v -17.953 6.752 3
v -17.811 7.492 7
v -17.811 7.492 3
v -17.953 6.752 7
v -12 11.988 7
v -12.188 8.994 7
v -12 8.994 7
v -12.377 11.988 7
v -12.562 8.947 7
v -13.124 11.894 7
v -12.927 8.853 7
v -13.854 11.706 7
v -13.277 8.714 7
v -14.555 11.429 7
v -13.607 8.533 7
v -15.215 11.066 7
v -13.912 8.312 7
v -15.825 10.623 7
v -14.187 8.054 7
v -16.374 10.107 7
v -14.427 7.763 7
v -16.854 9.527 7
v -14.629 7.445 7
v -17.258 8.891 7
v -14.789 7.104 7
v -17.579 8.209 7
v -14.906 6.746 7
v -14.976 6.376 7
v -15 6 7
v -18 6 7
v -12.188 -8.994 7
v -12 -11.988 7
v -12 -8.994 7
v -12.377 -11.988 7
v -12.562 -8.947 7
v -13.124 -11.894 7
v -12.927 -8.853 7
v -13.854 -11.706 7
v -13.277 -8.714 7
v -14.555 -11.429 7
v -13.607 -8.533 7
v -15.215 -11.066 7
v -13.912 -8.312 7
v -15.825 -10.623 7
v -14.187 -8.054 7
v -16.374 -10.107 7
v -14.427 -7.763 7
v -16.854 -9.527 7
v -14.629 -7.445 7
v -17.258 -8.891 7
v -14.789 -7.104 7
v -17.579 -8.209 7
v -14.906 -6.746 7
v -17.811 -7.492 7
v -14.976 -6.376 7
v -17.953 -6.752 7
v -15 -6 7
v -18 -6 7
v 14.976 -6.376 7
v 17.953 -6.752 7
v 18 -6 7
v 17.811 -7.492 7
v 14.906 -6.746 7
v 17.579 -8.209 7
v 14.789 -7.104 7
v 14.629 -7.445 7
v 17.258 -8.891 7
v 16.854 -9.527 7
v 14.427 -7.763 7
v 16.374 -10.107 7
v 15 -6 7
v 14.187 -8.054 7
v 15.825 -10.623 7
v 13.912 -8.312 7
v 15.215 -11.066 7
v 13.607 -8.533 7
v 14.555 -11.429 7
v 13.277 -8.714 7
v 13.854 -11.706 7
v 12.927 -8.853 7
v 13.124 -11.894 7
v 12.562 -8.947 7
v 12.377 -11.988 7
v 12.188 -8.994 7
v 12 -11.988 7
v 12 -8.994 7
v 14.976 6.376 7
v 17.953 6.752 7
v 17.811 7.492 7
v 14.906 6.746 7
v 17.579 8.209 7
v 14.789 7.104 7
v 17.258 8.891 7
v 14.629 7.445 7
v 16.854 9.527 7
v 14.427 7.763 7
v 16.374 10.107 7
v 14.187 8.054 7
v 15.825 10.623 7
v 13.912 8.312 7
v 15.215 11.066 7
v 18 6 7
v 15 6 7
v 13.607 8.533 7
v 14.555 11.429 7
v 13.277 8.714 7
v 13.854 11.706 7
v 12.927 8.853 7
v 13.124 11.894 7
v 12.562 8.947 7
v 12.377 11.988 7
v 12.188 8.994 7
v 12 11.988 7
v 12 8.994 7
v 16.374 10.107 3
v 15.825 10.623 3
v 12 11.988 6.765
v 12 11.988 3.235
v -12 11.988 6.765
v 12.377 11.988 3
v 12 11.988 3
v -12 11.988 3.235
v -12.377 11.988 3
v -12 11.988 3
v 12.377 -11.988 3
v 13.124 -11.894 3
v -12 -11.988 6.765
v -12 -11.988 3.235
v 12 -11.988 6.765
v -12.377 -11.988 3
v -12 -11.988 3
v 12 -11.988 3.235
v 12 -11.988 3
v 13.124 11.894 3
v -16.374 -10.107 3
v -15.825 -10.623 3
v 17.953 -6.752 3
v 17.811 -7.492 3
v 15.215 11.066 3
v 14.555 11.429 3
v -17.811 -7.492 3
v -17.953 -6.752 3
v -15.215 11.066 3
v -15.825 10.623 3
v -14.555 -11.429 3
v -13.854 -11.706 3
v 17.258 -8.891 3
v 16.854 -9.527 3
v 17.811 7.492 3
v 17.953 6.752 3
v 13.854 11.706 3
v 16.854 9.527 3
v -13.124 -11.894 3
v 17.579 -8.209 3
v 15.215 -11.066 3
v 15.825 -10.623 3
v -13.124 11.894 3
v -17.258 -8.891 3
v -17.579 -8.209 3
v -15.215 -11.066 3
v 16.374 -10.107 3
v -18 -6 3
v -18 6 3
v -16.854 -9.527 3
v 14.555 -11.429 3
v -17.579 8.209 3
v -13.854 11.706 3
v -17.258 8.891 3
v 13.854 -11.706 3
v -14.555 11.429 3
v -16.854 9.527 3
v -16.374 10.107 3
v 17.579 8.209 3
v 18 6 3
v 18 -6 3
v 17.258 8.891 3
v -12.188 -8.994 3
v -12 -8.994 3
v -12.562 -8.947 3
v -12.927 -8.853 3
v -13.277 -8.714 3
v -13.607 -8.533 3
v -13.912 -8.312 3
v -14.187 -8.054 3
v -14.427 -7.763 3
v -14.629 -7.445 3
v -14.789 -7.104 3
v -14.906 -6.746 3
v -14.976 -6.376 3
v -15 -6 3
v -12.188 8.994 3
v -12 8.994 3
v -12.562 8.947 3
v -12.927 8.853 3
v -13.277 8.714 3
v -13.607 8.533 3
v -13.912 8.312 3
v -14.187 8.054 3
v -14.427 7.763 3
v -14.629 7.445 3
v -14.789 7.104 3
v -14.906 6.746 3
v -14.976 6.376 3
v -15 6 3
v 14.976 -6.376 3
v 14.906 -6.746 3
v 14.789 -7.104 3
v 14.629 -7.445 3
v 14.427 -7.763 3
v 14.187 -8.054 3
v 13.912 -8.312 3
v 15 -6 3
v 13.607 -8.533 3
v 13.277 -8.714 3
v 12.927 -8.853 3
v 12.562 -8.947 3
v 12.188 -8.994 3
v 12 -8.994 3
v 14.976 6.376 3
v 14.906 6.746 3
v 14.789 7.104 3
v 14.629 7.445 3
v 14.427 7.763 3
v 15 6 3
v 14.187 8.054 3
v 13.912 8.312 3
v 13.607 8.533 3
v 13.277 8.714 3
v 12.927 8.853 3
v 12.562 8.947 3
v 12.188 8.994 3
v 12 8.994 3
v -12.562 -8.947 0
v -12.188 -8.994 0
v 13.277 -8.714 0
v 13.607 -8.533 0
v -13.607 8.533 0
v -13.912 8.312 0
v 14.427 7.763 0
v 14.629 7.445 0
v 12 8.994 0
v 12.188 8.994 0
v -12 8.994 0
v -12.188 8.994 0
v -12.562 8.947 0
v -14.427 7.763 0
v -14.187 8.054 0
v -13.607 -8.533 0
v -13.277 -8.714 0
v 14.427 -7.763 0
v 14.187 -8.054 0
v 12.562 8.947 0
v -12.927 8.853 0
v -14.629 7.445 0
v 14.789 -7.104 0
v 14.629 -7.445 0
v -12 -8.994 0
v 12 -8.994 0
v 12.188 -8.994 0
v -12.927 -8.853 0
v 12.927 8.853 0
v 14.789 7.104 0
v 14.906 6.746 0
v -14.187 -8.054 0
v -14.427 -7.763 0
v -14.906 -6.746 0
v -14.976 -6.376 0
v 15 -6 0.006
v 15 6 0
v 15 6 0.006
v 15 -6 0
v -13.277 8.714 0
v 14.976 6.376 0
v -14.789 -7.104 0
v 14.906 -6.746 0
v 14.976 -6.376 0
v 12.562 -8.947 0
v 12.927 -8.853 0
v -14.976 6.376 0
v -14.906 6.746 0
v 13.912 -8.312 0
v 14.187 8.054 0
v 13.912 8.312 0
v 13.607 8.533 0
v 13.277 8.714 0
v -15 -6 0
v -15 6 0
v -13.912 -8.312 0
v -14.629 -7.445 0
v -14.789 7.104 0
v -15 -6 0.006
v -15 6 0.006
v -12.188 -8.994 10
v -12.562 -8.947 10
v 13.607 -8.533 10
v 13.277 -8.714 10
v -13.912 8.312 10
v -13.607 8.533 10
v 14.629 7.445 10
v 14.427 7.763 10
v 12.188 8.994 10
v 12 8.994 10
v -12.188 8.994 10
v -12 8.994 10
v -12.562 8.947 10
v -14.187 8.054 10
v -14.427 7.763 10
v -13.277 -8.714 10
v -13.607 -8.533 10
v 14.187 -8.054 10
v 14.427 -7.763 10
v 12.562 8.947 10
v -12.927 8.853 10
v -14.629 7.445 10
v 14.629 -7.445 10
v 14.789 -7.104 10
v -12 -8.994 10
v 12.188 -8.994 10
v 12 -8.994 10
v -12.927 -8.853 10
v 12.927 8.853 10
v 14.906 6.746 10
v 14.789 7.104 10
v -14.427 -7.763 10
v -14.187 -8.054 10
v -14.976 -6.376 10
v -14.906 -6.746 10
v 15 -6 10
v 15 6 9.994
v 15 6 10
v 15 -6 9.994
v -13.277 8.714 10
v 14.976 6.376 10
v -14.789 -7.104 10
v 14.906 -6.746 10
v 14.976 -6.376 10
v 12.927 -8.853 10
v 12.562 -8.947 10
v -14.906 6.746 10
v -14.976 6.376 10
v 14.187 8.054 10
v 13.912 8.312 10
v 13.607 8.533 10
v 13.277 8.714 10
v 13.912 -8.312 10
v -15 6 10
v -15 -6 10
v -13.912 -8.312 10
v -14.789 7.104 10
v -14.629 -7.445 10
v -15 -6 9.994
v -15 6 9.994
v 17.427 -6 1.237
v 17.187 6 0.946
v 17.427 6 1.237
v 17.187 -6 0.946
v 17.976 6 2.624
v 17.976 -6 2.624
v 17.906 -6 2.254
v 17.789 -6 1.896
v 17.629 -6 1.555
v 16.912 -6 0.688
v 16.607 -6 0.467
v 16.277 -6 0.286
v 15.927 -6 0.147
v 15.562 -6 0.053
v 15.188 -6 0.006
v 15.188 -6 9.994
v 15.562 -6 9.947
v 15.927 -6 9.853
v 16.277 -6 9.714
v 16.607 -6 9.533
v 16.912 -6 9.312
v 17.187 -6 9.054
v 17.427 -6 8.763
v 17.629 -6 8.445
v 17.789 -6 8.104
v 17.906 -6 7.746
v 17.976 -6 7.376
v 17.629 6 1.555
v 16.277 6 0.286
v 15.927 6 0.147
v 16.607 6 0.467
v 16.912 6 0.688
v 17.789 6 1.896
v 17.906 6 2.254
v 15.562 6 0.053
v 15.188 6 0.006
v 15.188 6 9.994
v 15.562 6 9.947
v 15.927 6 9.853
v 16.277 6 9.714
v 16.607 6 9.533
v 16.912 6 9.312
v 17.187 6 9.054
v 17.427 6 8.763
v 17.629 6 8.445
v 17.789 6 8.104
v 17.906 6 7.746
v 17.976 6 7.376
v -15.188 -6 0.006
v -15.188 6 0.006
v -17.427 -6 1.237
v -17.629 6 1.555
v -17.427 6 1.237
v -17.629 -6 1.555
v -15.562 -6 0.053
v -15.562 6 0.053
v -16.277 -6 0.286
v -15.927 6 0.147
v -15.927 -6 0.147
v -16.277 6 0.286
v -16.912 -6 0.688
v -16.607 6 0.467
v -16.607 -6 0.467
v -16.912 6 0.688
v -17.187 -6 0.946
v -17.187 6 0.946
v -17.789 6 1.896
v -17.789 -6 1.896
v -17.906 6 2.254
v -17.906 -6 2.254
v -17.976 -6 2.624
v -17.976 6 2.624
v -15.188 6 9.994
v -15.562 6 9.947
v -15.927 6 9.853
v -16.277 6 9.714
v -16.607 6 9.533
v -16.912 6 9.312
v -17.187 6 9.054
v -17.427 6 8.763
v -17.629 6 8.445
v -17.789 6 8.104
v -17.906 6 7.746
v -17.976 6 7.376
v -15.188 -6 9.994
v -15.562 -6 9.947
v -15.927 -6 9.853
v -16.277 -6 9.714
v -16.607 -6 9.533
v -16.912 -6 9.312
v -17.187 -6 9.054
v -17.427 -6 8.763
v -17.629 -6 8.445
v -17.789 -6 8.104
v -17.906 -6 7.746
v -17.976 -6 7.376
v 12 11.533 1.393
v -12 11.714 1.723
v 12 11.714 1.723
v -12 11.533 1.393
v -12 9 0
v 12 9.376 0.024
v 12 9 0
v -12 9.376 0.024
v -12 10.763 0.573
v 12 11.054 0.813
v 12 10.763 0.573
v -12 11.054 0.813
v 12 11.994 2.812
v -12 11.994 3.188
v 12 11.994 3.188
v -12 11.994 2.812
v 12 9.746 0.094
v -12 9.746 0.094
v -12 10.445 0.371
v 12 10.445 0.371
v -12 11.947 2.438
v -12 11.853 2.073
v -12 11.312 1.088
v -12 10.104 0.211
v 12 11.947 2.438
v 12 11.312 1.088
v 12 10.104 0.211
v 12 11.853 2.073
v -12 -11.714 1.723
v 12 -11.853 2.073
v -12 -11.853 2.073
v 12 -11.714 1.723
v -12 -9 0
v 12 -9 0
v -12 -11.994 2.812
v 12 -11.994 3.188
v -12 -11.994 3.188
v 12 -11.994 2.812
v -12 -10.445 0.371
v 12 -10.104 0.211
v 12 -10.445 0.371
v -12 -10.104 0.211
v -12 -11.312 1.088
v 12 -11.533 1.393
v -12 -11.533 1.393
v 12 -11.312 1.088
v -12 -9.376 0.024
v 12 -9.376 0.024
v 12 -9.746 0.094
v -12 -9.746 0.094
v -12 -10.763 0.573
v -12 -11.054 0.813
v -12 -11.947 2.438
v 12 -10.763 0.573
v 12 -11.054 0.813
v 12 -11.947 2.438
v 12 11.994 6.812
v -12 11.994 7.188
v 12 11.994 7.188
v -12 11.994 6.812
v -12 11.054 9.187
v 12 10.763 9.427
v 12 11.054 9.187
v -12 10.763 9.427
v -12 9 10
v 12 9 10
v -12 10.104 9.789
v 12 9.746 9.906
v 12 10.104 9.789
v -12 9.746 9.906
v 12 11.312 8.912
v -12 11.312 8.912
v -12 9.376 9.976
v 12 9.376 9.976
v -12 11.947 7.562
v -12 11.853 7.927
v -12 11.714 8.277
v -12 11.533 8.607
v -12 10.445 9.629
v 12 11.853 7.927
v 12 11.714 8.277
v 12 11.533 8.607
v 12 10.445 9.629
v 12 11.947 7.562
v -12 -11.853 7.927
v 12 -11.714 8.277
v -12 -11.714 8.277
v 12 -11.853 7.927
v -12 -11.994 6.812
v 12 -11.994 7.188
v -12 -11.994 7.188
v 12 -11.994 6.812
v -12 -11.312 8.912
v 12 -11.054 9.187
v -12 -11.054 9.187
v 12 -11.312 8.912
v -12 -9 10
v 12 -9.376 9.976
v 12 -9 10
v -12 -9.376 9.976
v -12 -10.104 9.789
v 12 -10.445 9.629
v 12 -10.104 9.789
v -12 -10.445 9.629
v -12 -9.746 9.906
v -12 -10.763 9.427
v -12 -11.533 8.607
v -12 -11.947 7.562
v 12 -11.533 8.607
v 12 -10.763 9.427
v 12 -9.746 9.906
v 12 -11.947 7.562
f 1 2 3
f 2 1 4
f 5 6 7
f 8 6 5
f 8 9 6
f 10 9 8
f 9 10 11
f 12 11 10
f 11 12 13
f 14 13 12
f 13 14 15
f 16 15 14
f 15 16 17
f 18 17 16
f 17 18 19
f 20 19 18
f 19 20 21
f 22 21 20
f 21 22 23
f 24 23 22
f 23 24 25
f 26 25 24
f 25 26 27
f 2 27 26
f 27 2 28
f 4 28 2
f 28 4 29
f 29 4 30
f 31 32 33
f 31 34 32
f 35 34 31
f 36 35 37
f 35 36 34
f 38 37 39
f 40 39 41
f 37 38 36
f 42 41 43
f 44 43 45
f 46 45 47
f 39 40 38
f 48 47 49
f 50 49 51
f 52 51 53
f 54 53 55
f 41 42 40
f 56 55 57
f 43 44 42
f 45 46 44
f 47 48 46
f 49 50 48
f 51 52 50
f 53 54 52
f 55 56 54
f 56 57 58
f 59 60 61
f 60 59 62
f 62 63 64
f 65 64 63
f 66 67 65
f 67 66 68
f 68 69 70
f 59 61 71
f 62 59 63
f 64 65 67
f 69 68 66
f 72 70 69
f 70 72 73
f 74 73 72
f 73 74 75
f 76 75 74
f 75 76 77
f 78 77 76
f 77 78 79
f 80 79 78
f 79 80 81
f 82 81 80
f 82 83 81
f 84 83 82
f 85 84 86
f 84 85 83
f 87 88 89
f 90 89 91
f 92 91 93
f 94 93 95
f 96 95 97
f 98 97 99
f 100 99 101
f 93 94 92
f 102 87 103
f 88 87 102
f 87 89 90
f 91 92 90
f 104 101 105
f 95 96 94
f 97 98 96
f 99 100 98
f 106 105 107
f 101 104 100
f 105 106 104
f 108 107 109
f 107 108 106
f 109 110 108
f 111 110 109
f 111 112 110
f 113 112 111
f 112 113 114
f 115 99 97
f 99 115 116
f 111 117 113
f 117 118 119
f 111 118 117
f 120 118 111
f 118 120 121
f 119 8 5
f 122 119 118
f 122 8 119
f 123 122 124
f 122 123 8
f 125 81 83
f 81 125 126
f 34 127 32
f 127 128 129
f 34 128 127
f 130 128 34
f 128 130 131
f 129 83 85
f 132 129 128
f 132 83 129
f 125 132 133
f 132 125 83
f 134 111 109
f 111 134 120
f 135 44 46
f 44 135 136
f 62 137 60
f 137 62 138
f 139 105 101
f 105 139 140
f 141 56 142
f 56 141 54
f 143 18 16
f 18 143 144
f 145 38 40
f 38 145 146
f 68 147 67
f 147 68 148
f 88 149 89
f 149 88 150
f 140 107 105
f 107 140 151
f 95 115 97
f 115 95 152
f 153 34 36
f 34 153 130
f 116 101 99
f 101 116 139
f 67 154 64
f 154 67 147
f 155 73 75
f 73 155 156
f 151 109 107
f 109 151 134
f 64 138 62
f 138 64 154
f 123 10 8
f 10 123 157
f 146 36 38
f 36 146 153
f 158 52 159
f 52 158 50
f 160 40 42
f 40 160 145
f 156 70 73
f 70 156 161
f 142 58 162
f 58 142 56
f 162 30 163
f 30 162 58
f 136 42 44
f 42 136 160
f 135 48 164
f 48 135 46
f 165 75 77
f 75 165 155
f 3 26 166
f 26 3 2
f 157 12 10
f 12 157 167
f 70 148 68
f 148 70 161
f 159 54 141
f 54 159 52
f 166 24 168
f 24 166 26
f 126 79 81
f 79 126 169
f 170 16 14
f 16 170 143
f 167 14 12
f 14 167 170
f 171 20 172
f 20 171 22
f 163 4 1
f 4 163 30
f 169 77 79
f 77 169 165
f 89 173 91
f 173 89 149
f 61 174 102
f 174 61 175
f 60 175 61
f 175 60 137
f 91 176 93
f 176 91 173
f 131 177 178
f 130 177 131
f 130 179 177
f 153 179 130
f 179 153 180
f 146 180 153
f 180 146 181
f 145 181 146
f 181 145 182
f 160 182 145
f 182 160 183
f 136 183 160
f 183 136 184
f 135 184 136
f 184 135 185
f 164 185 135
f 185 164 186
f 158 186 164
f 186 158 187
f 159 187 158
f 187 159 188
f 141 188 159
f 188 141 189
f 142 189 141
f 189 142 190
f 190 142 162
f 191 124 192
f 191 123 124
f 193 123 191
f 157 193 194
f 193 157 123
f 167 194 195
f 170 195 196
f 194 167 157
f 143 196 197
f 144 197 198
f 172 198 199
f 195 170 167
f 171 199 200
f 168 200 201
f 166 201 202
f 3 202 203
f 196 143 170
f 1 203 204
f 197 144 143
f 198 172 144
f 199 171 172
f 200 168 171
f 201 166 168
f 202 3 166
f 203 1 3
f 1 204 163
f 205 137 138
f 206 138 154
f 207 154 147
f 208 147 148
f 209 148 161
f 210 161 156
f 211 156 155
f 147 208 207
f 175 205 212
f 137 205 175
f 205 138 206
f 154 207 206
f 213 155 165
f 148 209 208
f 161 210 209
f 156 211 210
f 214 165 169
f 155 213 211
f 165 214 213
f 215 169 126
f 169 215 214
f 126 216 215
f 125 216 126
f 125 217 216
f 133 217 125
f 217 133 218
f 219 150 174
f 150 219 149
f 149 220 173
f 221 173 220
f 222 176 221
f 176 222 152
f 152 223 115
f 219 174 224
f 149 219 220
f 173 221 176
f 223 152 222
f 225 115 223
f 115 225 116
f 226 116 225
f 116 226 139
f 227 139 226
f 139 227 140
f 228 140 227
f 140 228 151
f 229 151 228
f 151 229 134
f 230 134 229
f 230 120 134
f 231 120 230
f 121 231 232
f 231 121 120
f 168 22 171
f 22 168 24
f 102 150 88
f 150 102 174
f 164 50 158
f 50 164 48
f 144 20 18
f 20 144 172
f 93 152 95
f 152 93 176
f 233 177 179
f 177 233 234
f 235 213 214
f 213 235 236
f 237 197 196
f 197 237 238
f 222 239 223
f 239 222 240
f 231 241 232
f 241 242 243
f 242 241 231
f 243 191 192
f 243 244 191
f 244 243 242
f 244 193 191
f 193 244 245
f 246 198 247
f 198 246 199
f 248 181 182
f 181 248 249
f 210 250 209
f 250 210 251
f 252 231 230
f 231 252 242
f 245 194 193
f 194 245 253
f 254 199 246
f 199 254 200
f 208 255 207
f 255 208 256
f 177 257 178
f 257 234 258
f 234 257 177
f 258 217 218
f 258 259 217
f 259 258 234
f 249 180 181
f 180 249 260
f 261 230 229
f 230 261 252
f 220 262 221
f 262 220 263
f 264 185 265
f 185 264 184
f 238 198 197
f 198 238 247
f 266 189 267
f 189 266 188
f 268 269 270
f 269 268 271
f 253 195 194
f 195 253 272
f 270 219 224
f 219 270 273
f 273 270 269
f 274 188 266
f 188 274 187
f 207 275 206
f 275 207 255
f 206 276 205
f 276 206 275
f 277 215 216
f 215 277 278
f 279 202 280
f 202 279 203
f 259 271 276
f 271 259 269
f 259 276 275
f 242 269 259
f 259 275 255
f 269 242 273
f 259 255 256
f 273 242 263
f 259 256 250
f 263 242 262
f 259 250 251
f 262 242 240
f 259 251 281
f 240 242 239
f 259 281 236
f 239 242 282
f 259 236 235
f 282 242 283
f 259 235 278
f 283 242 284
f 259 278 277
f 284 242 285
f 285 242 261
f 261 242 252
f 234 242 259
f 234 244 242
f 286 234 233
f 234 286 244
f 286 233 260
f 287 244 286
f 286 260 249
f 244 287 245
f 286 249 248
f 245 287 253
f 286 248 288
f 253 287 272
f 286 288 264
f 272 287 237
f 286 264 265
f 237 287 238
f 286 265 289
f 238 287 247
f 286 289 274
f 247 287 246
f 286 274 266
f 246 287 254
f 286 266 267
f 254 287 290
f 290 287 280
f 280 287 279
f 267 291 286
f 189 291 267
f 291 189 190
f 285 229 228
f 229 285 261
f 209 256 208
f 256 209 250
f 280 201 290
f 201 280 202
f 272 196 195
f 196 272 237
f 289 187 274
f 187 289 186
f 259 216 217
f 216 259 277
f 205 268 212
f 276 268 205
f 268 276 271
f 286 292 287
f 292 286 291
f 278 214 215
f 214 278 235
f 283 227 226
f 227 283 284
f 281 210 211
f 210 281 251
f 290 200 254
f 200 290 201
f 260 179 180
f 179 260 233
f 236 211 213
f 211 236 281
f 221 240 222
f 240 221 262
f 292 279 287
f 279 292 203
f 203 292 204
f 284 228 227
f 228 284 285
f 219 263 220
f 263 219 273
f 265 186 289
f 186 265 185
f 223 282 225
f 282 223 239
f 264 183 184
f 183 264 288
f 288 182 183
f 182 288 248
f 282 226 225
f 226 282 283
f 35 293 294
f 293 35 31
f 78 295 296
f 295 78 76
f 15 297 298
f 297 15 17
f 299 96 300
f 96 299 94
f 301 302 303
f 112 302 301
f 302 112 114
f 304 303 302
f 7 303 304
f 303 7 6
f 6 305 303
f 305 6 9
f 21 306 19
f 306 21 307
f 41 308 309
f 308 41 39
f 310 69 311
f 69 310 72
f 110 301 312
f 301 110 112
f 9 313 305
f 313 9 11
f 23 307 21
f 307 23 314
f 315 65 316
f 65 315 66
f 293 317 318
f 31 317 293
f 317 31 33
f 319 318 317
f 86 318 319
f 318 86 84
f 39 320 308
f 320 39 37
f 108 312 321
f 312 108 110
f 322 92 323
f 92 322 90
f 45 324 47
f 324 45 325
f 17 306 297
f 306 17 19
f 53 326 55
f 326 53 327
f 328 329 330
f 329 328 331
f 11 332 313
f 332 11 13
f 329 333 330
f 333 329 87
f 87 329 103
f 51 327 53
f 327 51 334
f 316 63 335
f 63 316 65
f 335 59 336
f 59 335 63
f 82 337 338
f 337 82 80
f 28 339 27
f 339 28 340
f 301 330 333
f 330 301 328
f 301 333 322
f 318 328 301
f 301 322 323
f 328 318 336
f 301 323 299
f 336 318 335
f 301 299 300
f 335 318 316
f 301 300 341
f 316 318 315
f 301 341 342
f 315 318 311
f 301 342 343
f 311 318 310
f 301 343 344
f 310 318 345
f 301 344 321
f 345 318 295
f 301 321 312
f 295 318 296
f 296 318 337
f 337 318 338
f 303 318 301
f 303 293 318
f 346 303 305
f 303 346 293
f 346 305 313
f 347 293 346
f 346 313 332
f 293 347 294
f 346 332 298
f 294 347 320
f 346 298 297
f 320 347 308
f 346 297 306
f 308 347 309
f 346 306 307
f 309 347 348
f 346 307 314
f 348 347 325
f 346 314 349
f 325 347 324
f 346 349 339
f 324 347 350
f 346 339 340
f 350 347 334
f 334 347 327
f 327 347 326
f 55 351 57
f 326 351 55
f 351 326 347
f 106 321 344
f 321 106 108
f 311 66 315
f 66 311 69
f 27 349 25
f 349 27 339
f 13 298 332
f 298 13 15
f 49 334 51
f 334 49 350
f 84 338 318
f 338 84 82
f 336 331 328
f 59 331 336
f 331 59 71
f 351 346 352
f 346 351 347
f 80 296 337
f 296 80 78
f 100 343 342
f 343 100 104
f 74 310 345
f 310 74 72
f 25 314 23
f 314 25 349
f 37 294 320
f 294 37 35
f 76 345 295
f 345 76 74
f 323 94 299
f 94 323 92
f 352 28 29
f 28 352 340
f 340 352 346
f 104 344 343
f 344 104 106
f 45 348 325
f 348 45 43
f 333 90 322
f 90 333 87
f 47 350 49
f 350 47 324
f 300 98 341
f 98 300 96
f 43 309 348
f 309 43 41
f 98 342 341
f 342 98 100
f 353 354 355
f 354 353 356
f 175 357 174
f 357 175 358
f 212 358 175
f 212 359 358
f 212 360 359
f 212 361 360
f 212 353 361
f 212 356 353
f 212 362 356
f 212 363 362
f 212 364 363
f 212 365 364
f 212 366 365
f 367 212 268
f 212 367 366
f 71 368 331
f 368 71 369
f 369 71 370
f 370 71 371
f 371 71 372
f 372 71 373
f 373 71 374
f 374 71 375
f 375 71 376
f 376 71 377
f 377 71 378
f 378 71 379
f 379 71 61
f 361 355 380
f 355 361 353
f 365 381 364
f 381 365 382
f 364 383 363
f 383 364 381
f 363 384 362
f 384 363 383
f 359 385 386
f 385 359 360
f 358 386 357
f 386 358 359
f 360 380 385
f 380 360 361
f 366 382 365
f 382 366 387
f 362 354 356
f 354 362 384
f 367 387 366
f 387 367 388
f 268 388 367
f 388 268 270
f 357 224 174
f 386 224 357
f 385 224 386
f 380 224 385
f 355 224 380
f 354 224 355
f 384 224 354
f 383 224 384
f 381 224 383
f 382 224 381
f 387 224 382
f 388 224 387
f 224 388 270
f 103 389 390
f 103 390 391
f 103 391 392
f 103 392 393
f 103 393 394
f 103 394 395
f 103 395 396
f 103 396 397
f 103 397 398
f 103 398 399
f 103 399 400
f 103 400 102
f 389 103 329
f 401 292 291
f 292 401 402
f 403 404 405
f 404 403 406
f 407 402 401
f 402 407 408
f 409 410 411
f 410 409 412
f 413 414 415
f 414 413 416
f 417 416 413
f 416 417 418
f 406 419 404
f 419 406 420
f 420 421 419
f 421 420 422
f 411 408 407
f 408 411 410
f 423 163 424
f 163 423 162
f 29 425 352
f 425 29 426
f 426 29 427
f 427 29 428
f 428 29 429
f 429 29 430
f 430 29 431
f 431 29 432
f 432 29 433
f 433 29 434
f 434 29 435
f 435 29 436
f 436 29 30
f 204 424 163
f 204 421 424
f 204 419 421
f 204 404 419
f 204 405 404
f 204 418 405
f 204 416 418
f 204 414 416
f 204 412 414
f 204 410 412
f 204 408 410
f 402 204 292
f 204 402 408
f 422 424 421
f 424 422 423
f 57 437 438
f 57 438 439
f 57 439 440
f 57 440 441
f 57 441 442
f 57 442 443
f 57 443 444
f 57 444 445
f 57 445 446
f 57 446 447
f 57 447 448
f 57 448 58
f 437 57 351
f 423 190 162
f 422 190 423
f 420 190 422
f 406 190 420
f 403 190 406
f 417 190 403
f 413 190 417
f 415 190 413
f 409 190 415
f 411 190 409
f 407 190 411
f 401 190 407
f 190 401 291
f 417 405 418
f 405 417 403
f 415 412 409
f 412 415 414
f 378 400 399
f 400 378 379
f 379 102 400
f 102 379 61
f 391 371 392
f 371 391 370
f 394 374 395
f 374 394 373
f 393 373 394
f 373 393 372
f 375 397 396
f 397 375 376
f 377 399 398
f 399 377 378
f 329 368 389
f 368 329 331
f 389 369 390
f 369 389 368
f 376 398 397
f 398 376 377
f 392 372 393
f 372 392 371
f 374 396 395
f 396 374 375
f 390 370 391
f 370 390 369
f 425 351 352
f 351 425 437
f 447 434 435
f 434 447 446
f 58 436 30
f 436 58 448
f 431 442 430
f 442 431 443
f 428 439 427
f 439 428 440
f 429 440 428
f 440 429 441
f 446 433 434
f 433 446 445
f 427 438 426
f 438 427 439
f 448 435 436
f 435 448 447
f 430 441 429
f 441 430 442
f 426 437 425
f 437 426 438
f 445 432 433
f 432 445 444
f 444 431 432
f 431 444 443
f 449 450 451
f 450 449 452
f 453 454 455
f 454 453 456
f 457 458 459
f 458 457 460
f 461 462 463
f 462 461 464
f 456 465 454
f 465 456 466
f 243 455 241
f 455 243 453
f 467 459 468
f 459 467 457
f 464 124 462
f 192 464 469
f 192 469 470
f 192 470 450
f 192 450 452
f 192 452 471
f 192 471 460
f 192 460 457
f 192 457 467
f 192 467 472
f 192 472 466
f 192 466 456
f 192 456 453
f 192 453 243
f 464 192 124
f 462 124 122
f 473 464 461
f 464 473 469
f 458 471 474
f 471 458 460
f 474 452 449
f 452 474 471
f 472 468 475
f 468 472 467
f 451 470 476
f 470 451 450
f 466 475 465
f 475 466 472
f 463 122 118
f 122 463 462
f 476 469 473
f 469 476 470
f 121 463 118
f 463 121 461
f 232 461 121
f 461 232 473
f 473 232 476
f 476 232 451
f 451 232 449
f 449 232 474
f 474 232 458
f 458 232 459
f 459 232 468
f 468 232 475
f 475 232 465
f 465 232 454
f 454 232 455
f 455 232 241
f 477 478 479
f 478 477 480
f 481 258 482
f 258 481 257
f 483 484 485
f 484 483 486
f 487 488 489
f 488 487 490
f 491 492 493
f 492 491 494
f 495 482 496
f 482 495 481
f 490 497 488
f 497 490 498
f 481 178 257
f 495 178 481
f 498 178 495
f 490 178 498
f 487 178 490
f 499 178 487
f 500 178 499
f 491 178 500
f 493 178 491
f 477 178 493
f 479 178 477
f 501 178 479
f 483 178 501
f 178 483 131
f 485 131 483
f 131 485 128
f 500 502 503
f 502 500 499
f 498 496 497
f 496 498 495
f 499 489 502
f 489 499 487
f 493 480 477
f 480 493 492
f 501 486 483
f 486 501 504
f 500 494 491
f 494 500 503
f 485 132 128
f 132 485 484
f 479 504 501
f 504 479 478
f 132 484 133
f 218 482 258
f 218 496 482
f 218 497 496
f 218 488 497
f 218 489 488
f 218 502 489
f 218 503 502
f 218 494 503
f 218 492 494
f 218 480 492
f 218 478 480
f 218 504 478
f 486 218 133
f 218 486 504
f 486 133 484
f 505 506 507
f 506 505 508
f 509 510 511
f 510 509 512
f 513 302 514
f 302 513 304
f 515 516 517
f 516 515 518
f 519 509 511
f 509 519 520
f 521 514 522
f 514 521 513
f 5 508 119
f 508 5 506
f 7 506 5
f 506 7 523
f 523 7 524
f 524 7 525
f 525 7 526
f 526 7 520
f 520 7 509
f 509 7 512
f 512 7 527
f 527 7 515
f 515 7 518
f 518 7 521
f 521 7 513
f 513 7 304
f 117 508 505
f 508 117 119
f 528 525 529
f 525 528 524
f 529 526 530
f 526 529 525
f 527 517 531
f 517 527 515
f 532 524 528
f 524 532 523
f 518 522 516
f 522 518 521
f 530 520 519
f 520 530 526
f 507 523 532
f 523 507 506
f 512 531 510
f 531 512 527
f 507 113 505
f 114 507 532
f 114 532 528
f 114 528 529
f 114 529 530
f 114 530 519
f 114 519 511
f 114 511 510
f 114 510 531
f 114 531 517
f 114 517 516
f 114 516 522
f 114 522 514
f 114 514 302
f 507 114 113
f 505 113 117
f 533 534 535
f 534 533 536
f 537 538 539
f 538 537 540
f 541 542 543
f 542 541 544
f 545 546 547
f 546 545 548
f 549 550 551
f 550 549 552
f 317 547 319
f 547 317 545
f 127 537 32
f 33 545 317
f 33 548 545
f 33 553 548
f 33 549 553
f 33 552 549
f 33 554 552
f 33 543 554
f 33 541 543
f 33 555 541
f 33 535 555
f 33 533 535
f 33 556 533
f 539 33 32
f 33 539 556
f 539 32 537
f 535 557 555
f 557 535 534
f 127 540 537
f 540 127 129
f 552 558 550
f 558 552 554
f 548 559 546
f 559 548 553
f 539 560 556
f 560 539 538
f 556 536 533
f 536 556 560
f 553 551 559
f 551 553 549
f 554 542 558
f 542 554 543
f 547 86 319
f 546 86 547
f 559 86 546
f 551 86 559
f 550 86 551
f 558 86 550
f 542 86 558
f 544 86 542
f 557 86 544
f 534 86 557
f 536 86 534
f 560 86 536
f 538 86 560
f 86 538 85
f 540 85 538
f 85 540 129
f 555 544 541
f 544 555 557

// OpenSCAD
$fn = 50;

difference() {
	union() {
		translate(v = [0, 0, 0]) {
			rotate(a = [0, 0, 0]) {
				difference() {
					union() {
						translate(v = [0, 0, 3]) {
							hull() {
								translate(v = [-12.0, 6.0, 0]) {
									cylinder(h = 4, r = 6);
								}
								translate(v = [12.0, 6.0, 0]) {
									cylinder(h = 4, r = 6);
								}
								translate(v = [-12.0, -6.0, 0]) {
									cylinder(h = 4, r = 6);
								}
								translate(v = [12.0, -6.0, 0]) {
									cylinder(h = 4, r = 6);
								}
							}
						}
						hull() {
							translate(v = [-12.0, 6.0, 0]) {
								cylinder(h = 3, r = 3);
							}
							translate(v = [12.0, 6.0, 0]) {
								cylinder(h = 3, r = 3);
							}
							translate(v = [-12.0, -6.0, 0]) {
								cylinder(h = 3, r = 3);
							}
							translate(v = [12.0, -6.0, 0]) {
								cylinder(h = 3, r = 3);
							}
						}
						translate(v = [0, 0, 7]) {
							hull() {
								translate(v = [-12.0, 6.0, 0]) {
									cylinder(h = 3, r = 3);
								}
								translate(v = [12.0, 6.0, 0]) {
									cylinder(h = 3, r = 3);
								}
								translate(v = [-12.0, -6.0, 0]) {
									cylinder(h = 3, r = 3);
								}
								translate(v = [12.0, -6.0, 0]) {
									cylinder(h = 3, r = 3);
								}
							}
						}
						translate(v = [15.0, 6.0, 3.0]) {
							rotate(a = [90, 0, 0]) {
								cylinder(h = 12, r = 3);
							}
						}
						translate(v = [-15.0, 6.0, 3.0]) {
							rotate(a = [90, 0, 0]) {
								cylinder(h = 12, r = 3);
							}
						}
						translate(v = [15.0, 6.0, 7.0]) {
							rotate(a = [90, 0, 0]) {
								cylinder(h = 12, r = 3);
							}
						}
						translate(v = [-15.0, 6.0, 7.0]) {
							rotate(a = [90, 0, 0]) {
								cylinder(h = 12, r = 3);
							}
						}
						translate(v = [-12.0, 9.0, 3.0]) {
							rotate(a = [0, 90, 0]) {
								cylinder(h = 24, r = 3);
							}
						}
						translate(v = [-12.0, -9.0, 3.0]) {
							rotate(a = [0, 90, 0]) {
								cylinder(h = 24, r = 3);
							}
						}
						translate(v = [-12.0, 9.0, 7.0]) {
							rotate(a = [0, 90, 0]) {
								cylinder(h = 24, r = 3);
							}
						}
						translate(v = [-12.0, -9.0, 7.0]) {
							rotate(a = [0, 90, 0]) {
								cylinder(h = 24, r = 3);
							}
						}
						translate(v = [-12.0, -6.0, 3]) {
							rotate_extrude(angle = 360) {
								translate(v = [3.0, 0, 0]) {
									circle(r = 3.0);
								}
							}
						}
						translate(v = [12.0, -6.0, 3]) {
							rotate_extrude(angle = 360) {
								translate(v = [3.0, 0, 0]) {
									circle(r = 3.0);
								}
							}
						}
						translate(v = [12.0, 6.0, 3]) {
							rotate_extrude(angle = 360) {
								translate(v = [3.0, 0, 0]) {
									circle(r = 3.0);
								}
							}
						}
						translate(v = [-12.0, 6.0, 3]) {
							rotate_extrude(angle = 360) {
								translate(v = [3.0, 0, 0]) {
									circle(r = 3.0);
								}
							}
						}
						translate(v = [-12.0, -6.0, 7]) {
							rotate_extrude(angle = 360) {
								translate(v = [3.0, 0, 0]) {
									circle(r = 3.0);
								}
							}
						}
						translate(v = [12.0, -6.0, 7]) {
							rotate_extrude(angle = 360) {
								translate(v = [3.0, 0, 0]) {
									circle(r = 3.0);
								}
							}
						}
						translate(v = [12.0, 6.0, 7]) {
							rotate_extrude(angle = 360) {
								translate(v = [3.0, 0, 0]) {
									circle(r = 3.0);
								}
							}
						}
						translate(v = [-12.0, 6.0, 7]) {
							rotate_extrude(angle = 360) {
								translate(v = [3.0, 0, 0]) {
									circle(r = 3.0);
								}
							}
						}
						translate(v = [-12.0, -6.0, 3]) {
							rotate_extrude(angle = 360) {
								translate(v = [3.0, 0, 0]) {
									circle(r = 3.0);
								}
							}
						}
					}
					union();
				}
			}
		}
	}
	union();
}
